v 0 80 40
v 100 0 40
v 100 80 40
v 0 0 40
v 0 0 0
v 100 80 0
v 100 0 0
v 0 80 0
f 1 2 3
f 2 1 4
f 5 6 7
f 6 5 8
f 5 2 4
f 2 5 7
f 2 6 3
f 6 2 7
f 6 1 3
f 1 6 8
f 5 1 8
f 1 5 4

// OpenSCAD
// Width in millimetres
width = 100; // [10:5:200]
// Depth in millimetres
depth = 80; // [10:5:200]
// Height in millimetres
height = 40; // [10:5:100]

cube([width, depth, height]);
